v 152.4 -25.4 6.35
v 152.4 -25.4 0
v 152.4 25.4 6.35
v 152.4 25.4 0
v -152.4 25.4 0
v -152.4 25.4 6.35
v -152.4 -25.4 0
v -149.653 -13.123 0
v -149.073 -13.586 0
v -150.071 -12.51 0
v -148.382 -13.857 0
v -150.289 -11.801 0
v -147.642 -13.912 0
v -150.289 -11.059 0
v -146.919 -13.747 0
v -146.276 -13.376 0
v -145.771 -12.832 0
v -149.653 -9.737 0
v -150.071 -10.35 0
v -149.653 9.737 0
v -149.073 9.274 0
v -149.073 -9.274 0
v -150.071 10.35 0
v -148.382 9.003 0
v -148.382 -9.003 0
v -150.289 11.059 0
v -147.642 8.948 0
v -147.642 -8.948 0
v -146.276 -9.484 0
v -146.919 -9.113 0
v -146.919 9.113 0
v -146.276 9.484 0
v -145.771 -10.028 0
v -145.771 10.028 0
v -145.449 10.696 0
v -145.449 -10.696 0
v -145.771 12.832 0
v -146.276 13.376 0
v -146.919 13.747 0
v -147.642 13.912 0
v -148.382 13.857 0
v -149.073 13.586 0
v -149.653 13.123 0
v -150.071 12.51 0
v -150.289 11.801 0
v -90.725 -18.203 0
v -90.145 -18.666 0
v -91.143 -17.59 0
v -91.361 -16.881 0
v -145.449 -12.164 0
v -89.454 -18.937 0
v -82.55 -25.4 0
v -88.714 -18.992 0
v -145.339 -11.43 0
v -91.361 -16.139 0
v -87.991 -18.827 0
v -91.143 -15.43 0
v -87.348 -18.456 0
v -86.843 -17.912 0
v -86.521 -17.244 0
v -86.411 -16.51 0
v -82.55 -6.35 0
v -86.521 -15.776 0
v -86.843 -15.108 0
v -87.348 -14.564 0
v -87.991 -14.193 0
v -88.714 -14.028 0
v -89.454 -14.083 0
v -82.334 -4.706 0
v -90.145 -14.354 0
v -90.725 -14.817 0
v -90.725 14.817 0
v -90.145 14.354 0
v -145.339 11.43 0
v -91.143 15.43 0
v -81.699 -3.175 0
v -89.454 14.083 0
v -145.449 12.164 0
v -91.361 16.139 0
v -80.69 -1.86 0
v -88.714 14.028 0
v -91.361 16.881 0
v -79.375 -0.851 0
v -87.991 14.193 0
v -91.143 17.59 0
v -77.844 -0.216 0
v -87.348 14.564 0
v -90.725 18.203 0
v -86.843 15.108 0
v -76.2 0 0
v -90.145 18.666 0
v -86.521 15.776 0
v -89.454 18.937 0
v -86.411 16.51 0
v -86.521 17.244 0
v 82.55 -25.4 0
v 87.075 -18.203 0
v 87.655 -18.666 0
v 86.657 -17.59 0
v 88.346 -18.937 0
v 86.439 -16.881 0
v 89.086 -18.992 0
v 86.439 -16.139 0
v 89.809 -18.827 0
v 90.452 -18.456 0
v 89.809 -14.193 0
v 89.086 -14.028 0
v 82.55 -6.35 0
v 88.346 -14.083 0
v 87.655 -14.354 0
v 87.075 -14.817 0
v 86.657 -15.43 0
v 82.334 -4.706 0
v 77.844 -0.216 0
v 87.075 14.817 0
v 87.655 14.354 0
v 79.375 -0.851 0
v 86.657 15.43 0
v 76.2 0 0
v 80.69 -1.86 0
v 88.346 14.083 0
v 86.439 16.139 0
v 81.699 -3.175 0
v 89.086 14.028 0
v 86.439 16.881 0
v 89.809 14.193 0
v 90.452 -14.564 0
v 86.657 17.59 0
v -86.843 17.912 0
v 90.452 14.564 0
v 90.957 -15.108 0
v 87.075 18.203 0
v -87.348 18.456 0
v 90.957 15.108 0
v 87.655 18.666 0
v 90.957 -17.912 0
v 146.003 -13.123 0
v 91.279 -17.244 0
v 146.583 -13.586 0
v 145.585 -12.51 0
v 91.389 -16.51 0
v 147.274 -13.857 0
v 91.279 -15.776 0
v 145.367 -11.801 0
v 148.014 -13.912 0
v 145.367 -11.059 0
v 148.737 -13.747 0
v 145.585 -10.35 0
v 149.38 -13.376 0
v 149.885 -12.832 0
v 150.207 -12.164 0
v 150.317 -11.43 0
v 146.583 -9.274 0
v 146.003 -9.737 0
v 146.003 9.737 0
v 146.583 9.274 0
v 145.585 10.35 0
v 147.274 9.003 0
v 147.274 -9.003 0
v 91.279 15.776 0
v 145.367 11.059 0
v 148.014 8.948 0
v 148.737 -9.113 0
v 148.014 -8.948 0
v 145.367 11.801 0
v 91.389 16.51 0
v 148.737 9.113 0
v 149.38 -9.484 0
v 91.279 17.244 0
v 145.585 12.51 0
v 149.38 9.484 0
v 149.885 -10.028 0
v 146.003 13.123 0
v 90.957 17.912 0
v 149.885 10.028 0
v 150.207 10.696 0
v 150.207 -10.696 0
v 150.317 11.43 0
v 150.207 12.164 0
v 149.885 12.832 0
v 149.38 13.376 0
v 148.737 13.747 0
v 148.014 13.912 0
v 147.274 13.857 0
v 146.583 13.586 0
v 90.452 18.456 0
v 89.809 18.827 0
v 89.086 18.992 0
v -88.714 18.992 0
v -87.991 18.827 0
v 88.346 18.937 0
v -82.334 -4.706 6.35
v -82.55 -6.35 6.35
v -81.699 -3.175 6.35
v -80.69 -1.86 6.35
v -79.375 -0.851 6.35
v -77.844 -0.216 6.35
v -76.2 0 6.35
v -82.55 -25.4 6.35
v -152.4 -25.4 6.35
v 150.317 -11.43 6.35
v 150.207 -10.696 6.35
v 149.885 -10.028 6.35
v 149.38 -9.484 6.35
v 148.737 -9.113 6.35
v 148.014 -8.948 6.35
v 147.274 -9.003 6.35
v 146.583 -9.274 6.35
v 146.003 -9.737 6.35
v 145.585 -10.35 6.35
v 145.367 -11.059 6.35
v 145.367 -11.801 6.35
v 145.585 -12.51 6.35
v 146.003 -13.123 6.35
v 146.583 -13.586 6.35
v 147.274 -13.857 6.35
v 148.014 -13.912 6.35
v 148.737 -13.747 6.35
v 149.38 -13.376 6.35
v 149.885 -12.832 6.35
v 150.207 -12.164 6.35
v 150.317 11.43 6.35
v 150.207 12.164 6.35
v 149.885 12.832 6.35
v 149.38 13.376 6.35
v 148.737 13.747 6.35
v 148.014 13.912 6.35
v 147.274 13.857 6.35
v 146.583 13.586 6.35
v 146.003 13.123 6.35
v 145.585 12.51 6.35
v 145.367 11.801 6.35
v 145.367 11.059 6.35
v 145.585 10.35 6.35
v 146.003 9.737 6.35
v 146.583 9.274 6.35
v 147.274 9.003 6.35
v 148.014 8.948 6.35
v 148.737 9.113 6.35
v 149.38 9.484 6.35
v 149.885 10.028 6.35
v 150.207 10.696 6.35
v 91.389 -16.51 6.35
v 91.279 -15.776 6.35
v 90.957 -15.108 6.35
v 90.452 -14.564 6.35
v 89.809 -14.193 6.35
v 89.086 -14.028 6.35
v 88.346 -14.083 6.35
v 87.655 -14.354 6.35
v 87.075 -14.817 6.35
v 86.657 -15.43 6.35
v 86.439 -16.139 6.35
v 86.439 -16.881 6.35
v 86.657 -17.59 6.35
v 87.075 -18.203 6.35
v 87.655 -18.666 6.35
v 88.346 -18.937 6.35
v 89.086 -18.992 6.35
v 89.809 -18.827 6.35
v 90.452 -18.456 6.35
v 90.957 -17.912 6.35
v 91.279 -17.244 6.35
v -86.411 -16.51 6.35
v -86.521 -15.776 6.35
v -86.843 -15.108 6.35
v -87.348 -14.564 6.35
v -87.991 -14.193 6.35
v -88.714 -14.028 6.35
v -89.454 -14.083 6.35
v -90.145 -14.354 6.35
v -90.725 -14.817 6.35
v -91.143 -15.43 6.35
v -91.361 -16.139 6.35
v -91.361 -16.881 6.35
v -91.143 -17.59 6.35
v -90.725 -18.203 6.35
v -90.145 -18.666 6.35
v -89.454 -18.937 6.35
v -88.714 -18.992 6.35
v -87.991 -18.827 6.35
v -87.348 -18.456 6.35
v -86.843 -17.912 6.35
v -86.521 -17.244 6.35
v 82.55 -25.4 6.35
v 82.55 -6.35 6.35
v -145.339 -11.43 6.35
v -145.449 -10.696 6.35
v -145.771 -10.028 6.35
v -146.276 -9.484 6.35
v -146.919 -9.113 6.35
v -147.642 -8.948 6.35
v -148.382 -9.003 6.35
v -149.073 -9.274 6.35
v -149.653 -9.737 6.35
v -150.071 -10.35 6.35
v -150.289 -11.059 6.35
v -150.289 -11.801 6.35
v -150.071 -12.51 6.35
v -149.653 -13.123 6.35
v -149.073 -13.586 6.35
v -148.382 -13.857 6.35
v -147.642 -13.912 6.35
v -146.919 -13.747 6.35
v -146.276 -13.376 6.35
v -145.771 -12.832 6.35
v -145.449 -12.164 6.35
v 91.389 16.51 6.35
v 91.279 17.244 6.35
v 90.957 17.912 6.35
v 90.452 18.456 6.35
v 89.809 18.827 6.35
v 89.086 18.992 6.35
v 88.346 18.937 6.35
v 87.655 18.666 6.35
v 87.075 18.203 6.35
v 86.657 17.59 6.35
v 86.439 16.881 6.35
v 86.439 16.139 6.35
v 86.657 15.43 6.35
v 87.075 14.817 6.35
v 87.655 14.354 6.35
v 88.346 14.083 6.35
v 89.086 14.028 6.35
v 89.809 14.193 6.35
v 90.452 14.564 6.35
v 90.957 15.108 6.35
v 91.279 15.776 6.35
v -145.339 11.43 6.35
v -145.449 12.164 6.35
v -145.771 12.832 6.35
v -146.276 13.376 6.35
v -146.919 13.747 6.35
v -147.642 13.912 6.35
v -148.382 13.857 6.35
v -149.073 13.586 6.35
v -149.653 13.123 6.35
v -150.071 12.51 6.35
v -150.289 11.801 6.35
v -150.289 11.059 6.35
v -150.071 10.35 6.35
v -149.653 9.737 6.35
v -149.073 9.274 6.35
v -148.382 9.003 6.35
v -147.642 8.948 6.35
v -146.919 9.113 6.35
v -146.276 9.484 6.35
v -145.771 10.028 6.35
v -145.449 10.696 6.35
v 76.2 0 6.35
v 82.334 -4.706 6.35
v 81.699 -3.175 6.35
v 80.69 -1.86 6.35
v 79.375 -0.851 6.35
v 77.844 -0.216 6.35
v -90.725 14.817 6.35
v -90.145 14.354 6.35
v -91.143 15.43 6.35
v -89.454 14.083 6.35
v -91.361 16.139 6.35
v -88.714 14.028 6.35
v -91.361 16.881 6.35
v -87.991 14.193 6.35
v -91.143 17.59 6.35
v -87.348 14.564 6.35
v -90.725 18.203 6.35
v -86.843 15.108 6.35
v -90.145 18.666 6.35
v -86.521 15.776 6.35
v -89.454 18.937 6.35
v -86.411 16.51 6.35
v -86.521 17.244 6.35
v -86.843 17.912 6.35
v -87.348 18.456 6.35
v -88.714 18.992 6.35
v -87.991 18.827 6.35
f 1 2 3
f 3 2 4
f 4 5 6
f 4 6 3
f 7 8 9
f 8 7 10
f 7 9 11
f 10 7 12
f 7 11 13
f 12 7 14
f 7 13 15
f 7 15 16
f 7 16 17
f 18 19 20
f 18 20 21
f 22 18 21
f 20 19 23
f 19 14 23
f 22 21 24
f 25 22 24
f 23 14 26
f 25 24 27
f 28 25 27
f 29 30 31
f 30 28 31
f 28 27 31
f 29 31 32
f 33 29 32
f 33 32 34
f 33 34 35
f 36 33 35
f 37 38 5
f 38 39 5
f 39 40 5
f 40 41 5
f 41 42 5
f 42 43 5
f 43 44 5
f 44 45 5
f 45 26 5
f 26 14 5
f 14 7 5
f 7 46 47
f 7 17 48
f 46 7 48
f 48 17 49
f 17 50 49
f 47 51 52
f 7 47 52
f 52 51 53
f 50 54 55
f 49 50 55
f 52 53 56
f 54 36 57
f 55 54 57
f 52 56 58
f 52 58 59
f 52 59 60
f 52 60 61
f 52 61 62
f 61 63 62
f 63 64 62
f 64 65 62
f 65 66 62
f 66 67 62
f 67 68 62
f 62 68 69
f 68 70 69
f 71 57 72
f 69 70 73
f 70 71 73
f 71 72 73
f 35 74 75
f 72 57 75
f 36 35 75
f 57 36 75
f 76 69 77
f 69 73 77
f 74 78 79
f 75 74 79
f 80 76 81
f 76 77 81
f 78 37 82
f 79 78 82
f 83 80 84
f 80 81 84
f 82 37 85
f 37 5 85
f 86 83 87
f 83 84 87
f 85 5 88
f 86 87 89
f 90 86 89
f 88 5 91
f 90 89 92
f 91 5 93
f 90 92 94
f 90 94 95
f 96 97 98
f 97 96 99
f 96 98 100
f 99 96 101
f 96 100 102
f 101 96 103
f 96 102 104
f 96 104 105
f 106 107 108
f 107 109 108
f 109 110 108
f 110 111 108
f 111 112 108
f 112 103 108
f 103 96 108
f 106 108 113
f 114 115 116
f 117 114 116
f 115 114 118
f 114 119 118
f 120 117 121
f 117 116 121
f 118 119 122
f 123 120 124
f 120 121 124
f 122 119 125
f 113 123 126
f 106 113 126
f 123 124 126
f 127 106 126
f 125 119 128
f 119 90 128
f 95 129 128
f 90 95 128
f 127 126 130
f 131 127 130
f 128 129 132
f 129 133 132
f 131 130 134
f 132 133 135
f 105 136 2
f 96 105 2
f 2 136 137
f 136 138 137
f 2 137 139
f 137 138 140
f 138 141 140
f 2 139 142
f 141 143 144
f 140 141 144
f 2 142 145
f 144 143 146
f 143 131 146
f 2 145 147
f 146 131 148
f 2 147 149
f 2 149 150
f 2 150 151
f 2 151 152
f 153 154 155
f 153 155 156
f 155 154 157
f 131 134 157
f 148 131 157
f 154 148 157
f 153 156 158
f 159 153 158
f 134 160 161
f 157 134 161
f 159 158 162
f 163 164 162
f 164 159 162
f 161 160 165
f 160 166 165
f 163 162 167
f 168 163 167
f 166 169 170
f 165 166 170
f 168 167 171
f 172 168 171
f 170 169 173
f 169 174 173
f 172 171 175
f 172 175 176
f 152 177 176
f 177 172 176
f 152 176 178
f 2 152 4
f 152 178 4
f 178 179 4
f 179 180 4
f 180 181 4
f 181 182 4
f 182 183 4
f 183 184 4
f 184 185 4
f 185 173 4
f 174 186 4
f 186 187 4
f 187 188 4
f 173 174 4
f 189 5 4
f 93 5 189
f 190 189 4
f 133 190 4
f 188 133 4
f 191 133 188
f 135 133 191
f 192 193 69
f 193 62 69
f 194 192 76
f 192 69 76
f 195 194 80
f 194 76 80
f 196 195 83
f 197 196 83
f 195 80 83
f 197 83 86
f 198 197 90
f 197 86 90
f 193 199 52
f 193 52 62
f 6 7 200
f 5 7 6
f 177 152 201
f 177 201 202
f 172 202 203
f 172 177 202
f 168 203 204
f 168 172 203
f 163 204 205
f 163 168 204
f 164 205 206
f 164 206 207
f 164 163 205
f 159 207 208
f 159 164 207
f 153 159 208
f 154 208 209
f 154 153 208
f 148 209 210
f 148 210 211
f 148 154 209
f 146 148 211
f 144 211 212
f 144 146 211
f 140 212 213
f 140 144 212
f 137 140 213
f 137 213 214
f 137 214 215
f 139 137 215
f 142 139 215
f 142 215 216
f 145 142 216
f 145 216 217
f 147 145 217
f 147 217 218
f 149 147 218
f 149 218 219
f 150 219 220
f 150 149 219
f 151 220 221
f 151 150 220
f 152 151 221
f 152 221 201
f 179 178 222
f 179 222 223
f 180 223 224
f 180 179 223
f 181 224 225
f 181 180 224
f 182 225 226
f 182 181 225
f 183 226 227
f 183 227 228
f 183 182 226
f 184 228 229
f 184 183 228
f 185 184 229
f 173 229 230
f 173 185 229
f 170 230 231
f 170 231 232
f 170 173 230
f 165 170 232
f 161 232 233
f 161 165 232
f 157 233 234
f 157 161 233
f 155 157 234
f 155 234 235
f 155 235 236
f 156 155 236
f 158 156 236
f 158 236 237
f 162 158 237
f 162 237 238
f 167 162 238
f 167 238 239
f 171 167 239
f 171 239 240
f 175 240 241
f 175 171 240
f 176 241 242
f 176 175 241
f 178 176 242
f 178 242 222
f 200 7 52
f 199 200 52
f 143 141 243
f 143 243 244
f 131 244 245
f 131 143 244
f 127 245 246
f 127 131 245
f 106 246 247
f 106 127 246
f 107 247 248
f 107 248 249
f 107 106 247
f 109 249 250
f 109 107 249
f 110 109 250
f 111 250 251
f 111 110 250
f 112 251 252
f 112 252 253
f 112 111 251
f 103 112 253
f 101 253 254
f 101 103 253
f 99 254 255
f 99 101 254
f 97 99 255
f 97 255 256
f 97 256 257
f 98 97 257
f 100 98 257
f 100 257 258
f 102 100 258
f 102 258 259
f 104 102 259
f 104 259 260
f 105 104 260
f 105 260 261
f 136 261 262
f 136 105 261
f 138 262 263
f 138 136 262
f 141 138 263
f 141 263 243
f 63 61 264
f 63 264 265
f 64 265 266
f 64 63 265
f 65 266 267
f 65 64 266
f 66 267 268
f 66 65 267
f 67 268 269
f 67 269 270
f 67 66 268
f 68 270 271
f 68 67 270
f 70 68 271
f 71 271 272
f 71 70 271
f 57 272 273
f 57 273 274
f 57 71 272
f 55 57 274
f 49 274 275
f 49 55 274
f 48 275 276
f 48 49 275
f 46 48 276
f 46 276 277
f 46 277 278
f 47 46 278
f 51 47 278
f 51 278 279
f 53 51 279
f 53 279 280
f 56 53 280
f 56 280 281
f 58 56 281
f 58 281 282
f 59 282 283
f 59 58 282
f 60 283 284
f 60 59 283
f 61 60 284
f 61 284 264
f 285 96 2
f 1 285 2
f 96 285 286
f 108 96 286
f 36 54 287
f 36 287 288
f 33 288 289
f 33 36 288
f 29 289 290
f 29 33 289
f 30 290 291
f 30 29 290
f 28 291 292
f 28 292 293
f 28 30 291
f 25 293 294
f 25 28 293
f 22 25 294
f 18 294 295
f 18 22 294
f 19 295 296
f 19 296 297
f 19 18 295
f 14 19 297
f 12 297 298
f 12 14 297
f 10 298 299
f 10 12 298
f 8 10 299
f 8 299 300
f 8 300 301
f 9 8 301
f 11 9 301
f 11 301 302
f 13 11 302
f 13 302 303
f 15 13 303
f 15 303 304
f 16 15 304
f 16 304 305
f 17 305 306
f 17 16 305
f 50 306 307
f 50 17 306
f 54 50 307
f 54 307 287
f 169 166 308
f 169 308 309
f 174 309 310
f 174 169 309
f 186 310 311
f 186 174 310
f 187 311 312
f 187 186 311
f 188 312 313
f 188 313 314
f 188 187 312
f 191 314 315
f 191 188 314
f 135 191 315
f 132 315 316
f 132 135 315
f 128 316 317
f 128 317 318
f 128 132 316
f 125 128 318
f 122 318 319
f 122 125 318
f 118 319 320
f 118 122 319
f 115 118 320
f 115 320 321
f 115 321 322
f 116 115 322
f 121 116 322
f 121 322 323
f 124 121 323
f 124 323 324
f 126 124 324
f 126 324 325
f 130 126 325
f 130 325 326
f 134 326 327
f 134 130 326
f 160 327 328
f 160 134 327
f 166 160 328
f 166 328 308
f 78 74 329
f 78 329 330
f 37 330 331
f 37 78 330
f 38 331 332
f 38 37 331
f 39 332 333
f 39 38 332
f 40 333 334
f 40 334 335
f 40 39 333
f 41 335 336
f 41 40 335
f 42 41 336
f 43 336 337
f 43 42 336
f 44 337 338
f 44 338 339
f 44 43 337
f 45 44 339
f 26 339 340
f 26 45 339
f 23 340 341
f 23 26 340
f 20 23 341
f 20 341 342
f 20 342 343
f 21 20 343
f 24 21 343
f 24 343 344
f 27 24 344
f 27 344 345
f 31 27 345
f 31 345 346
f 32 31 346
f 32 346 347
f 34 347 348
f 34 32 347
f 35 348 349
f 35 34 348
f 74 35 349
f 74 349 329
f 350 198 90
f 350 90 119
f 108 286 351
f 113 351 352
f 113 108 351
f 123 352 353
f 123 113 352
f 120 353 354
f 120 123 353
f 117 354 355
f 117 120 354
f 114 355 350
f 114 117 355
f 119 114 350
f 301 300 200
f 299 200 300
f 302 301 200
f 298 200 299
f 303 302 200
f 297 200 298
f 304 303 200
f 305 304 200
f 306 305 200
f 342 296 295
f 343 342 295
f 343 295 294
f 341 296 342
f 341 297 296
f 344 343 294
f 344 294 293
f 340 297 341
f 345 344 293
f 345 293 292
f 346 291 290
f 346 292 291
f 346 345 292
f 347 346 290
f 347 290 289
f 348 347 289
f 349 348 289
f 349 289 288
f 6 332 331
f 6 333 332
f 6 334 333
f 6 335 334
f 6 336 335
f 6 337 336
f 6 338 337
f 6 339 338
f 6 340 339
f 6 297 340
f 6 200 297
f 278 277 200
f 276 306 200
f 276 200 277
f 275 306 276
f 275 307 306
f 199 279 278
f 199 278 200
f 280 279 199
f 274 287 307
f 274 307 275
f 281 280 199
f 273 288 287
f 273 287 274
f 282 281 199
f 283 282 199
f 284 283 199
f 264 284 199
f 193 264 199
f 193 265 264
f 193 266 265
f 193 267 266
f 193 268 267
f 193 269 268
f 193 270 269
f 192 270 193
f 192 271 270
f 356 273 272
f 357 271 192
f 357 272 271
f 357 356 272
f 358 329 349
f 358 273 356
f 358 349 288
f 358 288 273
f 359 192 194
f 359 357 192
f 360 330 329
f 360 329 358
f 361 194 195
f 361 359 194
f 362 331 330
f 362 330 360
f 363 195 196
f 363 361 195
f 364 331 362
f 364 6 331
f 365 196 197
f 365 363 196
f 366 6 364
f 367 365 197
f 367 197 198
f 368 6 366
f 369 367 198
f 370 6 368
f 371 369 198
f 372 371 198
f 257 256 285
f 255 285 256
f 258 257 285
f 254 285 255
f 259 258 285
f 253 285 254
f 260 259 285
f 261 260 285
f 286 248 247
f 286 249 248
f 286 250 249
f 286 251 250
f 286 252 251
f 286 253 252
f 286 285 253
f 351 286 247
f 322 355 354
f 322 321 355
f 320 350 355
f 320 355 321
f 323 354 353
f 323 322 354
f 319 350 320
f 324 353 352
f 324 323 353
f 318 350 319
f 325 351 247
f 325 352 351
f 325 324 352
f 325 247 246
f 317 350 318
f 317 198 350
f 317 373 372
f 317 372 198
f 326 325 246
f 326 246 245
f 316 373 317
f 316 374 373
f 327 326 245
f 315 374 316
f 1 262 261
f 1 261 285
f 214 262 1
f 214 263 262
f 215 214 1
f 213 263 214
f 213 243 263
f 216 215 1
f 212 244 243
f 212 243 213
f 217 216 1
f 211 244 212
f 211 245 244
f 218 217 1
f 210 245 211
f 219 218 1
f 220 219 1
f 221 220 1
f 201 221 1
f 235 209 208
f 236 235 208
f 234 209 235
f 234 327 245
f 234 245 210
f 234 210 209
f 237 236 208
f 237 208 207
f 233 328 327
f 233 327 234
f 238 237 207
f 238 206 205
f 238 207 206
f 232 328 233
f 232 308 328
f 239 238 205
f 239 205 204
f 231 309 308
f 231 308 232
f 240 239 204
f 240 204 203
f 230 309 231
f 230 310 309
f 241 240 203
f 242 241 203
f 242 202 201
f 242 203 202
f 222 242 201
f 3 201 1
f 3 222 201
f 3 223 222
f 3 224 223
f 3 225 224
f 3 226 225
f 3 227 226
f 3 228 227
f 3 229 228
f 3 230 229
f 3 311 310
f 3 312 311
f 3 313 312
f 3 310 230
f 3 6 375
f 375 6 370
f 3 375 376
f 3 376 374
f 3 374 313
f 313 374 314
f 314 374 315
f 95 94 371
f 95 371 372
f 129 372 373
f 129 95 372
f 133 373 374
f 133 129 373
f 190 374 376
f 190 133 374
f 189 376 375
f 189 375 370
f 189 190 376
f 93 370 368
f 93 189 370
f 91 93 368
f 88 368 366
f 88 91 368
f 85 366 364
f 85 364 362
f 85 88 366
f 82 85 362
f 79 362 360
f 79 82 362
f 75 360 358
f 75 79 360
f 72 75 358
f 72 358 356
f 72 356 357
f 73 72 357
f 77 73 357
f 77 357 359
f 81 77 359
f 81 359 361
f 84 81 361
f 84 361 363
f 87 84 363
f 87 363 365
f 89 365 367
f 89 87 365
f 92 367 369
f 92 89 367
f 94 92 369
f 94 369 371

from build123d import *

# Parameters (mm, degrees)
SKETCH1_W           = 304.8
SKETCH1_H           = 50.8
SKETCH1_R           = 2.4892
BOSS_EXTRUDE1_DEPTH = 6.35
SKETCH3_W           = 165.1
SKETCH3_H           = 25.4
CUT_EXTRUDE1_DEPTH  = 155.632604906
FILLET1_R           = 6.35


with BuildPart() as part:
    # Sketch1 → Boss-Extrude1 (new body)
    with BuildSketch(Plane.XY):
        Rectangle(SKETCH1_W, SKETCH1_H)
        with Locations((-88.9, 16.51)):
            Circle(SKETCH1_R, mode=Mode.SUBTRACT)
        with Locations((-88.9, -16.51)):
            Circle(SKETCH1_R, mode=Mode.SUBTRACT)
        with Locations((88.9, -16.51)):
            Circle(SKETCH1_R, mode=Mode.SUBTRACT)
        with Locations((88.9, 16.51)):
            Circle(SKETCH1_R, mode=Mode.SUBTRACT)
        with Locations((-147.828, 11.43)):
            Circle(SKETCH1_R, mode=Mode.SUBTRACT)
        with Locations((-147.828, -11.43)):
            Circle(SKETCH1_R, mode=Mode.SUBTRACT)
        with Locations((147.828, 11.43)):
            Circle(SKETCH1_R, mode=Mode.SUBTRACT)
        with Locations((147.828, -11.43)):
            Circle(SKETCH1_R, mode=Mode.SUBTRACT)
    extrude(amount=BOSS_EXTRUDE1_DEPTH)

    # Sketch3 → Cut-Extrude1 (cut, through all)
    with BuildSketch(Plane.XY.offset(6.35)):
        with Locations((0, -12.7)):
            Rectangle(SKETCH3_W, SKETCH3_H)
    extrude(amount=-CUT_EXTRUDE1_DEPTH, mode=Mode.SUBTRACT)

    # Fillet1
    fillet1_edges = [part.edges().sort_by_distance(p)[0] for p in [
        (-82.55, 0, 3.175),
        (82.55, 0, 3.175),
    ]]
    fillet(fillet1_edges, radius=FILLET1_R)


solid = part.part
